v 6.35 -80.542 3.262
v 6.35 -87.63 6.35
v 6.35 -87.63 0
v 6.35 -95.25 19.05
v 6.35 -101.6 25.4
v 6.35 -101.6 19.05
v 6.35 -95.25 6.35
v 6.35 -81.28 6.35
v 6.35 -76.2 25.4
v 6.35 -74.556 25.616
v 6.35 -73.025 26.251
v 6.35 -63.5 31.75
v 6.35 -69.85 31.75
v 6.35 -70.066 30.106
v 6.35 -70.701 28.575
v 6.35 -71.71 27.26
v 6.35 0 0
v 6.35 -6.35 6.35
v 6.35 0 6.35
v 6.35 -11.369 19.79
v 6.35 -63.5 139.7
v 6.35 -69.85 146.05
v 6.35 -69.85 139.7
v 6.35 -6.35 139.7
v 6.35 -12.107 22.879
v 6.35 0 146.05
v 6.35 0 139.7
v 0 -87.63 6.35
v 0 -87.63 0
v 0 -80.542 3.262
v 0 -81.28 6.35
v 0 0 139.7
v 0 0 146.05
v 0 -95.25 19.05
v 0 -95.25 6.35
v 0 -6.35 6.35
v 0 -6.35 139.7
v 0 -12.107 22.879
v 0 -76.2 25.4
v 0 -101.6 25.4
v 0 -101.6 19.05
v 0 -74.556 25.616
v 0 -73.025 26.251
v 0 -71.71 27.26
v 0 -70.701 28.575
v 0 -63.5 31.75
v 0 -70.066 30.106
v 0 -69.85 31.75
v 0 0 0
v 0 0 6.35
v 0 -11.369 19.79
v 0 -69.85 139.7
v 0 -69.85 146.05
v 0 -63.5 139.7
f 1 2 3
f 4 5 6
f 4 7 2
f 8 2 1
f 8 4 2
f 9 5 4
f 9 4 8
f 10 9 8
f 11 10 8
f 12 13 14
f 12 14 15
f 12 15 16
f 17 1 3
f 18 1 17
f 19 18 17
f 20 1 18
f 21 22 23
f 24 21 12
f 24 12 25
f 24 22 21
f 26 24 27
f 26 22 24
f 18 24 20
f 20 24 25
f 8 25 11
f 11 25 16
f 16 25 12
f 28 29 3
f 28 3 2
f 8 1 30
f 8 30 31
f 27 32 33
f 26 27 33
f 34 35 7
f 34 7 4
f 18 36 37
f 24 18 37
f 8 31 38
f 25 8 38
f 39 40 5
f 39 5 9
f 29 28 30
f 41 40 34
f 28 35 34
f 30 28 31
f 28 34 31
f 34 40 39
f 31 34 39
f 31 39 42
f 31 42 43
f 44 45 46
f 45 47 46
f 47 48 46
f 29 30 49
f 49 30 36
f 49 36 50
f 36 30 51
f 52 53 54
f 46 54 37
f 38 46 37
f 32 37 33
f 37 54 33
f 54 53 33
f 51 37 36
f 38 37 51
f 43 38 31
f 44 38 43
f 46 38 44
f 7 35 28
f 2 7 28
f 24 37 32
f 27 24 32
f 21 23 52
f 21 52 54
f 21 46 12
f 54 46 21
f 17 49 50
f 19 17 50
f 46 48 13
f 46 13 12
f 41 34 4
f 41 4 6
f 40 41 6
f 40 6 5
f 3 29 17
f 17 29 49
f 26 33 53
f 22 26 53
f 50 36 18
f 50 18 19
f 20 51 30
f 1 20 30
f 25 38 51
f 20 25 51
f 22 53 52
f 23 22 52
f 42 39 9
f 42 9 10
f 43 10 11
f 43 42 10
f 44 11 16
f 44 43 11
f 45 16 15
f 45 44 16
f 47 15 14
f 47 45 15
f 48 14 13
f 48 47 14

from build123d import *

# Parameters (mm, degrees)
F0_W      = 31.75
F0_H      = 25.4
F1_DEPTH  = 6.35
F2_W      = 6.35
F2_H      = 133.35
F3_DEPTH  = 12.446
F4_W      = 6.35
F4_H      = 107.95
F5_DEPTH  = 9.906
F6_W      = 7.62
F6_H      = 6.35
F7_DEPTH  = 10.668
F8_W      = 6.35
F8_H      = 6.35
F9_DEPTH  = 6.35
F10_R     = 6.35
F11_DEPTH = 8.9408
F13_DEPTH = 6.351


with BuildPart() as f1:
    # F0 (on Right) → F1 (new body)
    with BuildSketch(Plane.YZ):
        Polygon((-69.85, 0), (0, 0), (0, 146.05), (-69.85, 146.05), (-69.85, 25.4), align=None)
        with Locations((-85.725, 12.7)):
            Rectangle(F0_W, F0_H)
    extrude(amount=F1_DEPTH)

    # F2 (on Right) → F3 (cut)
    with BuildSketch(Plane.YZ):
        with Locations((-3.175, 73.025)):
            Rectangle(F2_W, F2_H)
    extrude(amount=F3_DEPTH, mode=Mode.SUBTRACT)

    # F4 (on Right) → F5 (cut)
    with BuildSketch(Plane.YZ):
        with Locations((-66.675, 85.725)):
            Rectangle(F4_W, F4_H)
    extrude(amount=F5_DEPTH, mode=Mode.SUBTRACT)

    # F6 (on Right) → F7 (cut)
    with BuildSketch(Plane.YZ):
        Polygon((-95.25, 19.05), (-101.6, 19.05), (-101.6, 0), (-95.25, 0), (-95.25, 6.35), align=None)
        with Locations((-91.44, 3.175)):
            Rectangle(F6_W, F6_H)
    extrude(amount=F7_DEPTH, mode=Mode.SUBTRACT)

    # F8 (on Right) → F9 (join)
    with BuildSketch(Plane.YZ):
        with Locations((-73.025, 28.575)):
            Rectangle(F8_W, F8_H)
    extrude(amount=F9_DEPTH)

    # F10 (on Right) → F11 (cut)
    with BuildSketch(Plane.YZ):
        with Locations((-76.2, 31.75)):
            Circle(F10_R)
    extrude(amount=F11_DEPTH, mode=Mode.SUBTRACT)

    # F12 (on face) → F13 (cut, through all)
    with BuildSketch(Plane(origin=(0, 0, 0), x_dir=(0, -1, 0), z_dir=(-1, 0, 0))):
        Polygon((80.54212, 3.261933), (81.28, 6.35), (12.107297, 22.878509), (11.369418, 19.790442), align=None)
    extrude(amount=-F13_DEPTH, mode=Mode.SUBTRACT)


solid = f1.part
